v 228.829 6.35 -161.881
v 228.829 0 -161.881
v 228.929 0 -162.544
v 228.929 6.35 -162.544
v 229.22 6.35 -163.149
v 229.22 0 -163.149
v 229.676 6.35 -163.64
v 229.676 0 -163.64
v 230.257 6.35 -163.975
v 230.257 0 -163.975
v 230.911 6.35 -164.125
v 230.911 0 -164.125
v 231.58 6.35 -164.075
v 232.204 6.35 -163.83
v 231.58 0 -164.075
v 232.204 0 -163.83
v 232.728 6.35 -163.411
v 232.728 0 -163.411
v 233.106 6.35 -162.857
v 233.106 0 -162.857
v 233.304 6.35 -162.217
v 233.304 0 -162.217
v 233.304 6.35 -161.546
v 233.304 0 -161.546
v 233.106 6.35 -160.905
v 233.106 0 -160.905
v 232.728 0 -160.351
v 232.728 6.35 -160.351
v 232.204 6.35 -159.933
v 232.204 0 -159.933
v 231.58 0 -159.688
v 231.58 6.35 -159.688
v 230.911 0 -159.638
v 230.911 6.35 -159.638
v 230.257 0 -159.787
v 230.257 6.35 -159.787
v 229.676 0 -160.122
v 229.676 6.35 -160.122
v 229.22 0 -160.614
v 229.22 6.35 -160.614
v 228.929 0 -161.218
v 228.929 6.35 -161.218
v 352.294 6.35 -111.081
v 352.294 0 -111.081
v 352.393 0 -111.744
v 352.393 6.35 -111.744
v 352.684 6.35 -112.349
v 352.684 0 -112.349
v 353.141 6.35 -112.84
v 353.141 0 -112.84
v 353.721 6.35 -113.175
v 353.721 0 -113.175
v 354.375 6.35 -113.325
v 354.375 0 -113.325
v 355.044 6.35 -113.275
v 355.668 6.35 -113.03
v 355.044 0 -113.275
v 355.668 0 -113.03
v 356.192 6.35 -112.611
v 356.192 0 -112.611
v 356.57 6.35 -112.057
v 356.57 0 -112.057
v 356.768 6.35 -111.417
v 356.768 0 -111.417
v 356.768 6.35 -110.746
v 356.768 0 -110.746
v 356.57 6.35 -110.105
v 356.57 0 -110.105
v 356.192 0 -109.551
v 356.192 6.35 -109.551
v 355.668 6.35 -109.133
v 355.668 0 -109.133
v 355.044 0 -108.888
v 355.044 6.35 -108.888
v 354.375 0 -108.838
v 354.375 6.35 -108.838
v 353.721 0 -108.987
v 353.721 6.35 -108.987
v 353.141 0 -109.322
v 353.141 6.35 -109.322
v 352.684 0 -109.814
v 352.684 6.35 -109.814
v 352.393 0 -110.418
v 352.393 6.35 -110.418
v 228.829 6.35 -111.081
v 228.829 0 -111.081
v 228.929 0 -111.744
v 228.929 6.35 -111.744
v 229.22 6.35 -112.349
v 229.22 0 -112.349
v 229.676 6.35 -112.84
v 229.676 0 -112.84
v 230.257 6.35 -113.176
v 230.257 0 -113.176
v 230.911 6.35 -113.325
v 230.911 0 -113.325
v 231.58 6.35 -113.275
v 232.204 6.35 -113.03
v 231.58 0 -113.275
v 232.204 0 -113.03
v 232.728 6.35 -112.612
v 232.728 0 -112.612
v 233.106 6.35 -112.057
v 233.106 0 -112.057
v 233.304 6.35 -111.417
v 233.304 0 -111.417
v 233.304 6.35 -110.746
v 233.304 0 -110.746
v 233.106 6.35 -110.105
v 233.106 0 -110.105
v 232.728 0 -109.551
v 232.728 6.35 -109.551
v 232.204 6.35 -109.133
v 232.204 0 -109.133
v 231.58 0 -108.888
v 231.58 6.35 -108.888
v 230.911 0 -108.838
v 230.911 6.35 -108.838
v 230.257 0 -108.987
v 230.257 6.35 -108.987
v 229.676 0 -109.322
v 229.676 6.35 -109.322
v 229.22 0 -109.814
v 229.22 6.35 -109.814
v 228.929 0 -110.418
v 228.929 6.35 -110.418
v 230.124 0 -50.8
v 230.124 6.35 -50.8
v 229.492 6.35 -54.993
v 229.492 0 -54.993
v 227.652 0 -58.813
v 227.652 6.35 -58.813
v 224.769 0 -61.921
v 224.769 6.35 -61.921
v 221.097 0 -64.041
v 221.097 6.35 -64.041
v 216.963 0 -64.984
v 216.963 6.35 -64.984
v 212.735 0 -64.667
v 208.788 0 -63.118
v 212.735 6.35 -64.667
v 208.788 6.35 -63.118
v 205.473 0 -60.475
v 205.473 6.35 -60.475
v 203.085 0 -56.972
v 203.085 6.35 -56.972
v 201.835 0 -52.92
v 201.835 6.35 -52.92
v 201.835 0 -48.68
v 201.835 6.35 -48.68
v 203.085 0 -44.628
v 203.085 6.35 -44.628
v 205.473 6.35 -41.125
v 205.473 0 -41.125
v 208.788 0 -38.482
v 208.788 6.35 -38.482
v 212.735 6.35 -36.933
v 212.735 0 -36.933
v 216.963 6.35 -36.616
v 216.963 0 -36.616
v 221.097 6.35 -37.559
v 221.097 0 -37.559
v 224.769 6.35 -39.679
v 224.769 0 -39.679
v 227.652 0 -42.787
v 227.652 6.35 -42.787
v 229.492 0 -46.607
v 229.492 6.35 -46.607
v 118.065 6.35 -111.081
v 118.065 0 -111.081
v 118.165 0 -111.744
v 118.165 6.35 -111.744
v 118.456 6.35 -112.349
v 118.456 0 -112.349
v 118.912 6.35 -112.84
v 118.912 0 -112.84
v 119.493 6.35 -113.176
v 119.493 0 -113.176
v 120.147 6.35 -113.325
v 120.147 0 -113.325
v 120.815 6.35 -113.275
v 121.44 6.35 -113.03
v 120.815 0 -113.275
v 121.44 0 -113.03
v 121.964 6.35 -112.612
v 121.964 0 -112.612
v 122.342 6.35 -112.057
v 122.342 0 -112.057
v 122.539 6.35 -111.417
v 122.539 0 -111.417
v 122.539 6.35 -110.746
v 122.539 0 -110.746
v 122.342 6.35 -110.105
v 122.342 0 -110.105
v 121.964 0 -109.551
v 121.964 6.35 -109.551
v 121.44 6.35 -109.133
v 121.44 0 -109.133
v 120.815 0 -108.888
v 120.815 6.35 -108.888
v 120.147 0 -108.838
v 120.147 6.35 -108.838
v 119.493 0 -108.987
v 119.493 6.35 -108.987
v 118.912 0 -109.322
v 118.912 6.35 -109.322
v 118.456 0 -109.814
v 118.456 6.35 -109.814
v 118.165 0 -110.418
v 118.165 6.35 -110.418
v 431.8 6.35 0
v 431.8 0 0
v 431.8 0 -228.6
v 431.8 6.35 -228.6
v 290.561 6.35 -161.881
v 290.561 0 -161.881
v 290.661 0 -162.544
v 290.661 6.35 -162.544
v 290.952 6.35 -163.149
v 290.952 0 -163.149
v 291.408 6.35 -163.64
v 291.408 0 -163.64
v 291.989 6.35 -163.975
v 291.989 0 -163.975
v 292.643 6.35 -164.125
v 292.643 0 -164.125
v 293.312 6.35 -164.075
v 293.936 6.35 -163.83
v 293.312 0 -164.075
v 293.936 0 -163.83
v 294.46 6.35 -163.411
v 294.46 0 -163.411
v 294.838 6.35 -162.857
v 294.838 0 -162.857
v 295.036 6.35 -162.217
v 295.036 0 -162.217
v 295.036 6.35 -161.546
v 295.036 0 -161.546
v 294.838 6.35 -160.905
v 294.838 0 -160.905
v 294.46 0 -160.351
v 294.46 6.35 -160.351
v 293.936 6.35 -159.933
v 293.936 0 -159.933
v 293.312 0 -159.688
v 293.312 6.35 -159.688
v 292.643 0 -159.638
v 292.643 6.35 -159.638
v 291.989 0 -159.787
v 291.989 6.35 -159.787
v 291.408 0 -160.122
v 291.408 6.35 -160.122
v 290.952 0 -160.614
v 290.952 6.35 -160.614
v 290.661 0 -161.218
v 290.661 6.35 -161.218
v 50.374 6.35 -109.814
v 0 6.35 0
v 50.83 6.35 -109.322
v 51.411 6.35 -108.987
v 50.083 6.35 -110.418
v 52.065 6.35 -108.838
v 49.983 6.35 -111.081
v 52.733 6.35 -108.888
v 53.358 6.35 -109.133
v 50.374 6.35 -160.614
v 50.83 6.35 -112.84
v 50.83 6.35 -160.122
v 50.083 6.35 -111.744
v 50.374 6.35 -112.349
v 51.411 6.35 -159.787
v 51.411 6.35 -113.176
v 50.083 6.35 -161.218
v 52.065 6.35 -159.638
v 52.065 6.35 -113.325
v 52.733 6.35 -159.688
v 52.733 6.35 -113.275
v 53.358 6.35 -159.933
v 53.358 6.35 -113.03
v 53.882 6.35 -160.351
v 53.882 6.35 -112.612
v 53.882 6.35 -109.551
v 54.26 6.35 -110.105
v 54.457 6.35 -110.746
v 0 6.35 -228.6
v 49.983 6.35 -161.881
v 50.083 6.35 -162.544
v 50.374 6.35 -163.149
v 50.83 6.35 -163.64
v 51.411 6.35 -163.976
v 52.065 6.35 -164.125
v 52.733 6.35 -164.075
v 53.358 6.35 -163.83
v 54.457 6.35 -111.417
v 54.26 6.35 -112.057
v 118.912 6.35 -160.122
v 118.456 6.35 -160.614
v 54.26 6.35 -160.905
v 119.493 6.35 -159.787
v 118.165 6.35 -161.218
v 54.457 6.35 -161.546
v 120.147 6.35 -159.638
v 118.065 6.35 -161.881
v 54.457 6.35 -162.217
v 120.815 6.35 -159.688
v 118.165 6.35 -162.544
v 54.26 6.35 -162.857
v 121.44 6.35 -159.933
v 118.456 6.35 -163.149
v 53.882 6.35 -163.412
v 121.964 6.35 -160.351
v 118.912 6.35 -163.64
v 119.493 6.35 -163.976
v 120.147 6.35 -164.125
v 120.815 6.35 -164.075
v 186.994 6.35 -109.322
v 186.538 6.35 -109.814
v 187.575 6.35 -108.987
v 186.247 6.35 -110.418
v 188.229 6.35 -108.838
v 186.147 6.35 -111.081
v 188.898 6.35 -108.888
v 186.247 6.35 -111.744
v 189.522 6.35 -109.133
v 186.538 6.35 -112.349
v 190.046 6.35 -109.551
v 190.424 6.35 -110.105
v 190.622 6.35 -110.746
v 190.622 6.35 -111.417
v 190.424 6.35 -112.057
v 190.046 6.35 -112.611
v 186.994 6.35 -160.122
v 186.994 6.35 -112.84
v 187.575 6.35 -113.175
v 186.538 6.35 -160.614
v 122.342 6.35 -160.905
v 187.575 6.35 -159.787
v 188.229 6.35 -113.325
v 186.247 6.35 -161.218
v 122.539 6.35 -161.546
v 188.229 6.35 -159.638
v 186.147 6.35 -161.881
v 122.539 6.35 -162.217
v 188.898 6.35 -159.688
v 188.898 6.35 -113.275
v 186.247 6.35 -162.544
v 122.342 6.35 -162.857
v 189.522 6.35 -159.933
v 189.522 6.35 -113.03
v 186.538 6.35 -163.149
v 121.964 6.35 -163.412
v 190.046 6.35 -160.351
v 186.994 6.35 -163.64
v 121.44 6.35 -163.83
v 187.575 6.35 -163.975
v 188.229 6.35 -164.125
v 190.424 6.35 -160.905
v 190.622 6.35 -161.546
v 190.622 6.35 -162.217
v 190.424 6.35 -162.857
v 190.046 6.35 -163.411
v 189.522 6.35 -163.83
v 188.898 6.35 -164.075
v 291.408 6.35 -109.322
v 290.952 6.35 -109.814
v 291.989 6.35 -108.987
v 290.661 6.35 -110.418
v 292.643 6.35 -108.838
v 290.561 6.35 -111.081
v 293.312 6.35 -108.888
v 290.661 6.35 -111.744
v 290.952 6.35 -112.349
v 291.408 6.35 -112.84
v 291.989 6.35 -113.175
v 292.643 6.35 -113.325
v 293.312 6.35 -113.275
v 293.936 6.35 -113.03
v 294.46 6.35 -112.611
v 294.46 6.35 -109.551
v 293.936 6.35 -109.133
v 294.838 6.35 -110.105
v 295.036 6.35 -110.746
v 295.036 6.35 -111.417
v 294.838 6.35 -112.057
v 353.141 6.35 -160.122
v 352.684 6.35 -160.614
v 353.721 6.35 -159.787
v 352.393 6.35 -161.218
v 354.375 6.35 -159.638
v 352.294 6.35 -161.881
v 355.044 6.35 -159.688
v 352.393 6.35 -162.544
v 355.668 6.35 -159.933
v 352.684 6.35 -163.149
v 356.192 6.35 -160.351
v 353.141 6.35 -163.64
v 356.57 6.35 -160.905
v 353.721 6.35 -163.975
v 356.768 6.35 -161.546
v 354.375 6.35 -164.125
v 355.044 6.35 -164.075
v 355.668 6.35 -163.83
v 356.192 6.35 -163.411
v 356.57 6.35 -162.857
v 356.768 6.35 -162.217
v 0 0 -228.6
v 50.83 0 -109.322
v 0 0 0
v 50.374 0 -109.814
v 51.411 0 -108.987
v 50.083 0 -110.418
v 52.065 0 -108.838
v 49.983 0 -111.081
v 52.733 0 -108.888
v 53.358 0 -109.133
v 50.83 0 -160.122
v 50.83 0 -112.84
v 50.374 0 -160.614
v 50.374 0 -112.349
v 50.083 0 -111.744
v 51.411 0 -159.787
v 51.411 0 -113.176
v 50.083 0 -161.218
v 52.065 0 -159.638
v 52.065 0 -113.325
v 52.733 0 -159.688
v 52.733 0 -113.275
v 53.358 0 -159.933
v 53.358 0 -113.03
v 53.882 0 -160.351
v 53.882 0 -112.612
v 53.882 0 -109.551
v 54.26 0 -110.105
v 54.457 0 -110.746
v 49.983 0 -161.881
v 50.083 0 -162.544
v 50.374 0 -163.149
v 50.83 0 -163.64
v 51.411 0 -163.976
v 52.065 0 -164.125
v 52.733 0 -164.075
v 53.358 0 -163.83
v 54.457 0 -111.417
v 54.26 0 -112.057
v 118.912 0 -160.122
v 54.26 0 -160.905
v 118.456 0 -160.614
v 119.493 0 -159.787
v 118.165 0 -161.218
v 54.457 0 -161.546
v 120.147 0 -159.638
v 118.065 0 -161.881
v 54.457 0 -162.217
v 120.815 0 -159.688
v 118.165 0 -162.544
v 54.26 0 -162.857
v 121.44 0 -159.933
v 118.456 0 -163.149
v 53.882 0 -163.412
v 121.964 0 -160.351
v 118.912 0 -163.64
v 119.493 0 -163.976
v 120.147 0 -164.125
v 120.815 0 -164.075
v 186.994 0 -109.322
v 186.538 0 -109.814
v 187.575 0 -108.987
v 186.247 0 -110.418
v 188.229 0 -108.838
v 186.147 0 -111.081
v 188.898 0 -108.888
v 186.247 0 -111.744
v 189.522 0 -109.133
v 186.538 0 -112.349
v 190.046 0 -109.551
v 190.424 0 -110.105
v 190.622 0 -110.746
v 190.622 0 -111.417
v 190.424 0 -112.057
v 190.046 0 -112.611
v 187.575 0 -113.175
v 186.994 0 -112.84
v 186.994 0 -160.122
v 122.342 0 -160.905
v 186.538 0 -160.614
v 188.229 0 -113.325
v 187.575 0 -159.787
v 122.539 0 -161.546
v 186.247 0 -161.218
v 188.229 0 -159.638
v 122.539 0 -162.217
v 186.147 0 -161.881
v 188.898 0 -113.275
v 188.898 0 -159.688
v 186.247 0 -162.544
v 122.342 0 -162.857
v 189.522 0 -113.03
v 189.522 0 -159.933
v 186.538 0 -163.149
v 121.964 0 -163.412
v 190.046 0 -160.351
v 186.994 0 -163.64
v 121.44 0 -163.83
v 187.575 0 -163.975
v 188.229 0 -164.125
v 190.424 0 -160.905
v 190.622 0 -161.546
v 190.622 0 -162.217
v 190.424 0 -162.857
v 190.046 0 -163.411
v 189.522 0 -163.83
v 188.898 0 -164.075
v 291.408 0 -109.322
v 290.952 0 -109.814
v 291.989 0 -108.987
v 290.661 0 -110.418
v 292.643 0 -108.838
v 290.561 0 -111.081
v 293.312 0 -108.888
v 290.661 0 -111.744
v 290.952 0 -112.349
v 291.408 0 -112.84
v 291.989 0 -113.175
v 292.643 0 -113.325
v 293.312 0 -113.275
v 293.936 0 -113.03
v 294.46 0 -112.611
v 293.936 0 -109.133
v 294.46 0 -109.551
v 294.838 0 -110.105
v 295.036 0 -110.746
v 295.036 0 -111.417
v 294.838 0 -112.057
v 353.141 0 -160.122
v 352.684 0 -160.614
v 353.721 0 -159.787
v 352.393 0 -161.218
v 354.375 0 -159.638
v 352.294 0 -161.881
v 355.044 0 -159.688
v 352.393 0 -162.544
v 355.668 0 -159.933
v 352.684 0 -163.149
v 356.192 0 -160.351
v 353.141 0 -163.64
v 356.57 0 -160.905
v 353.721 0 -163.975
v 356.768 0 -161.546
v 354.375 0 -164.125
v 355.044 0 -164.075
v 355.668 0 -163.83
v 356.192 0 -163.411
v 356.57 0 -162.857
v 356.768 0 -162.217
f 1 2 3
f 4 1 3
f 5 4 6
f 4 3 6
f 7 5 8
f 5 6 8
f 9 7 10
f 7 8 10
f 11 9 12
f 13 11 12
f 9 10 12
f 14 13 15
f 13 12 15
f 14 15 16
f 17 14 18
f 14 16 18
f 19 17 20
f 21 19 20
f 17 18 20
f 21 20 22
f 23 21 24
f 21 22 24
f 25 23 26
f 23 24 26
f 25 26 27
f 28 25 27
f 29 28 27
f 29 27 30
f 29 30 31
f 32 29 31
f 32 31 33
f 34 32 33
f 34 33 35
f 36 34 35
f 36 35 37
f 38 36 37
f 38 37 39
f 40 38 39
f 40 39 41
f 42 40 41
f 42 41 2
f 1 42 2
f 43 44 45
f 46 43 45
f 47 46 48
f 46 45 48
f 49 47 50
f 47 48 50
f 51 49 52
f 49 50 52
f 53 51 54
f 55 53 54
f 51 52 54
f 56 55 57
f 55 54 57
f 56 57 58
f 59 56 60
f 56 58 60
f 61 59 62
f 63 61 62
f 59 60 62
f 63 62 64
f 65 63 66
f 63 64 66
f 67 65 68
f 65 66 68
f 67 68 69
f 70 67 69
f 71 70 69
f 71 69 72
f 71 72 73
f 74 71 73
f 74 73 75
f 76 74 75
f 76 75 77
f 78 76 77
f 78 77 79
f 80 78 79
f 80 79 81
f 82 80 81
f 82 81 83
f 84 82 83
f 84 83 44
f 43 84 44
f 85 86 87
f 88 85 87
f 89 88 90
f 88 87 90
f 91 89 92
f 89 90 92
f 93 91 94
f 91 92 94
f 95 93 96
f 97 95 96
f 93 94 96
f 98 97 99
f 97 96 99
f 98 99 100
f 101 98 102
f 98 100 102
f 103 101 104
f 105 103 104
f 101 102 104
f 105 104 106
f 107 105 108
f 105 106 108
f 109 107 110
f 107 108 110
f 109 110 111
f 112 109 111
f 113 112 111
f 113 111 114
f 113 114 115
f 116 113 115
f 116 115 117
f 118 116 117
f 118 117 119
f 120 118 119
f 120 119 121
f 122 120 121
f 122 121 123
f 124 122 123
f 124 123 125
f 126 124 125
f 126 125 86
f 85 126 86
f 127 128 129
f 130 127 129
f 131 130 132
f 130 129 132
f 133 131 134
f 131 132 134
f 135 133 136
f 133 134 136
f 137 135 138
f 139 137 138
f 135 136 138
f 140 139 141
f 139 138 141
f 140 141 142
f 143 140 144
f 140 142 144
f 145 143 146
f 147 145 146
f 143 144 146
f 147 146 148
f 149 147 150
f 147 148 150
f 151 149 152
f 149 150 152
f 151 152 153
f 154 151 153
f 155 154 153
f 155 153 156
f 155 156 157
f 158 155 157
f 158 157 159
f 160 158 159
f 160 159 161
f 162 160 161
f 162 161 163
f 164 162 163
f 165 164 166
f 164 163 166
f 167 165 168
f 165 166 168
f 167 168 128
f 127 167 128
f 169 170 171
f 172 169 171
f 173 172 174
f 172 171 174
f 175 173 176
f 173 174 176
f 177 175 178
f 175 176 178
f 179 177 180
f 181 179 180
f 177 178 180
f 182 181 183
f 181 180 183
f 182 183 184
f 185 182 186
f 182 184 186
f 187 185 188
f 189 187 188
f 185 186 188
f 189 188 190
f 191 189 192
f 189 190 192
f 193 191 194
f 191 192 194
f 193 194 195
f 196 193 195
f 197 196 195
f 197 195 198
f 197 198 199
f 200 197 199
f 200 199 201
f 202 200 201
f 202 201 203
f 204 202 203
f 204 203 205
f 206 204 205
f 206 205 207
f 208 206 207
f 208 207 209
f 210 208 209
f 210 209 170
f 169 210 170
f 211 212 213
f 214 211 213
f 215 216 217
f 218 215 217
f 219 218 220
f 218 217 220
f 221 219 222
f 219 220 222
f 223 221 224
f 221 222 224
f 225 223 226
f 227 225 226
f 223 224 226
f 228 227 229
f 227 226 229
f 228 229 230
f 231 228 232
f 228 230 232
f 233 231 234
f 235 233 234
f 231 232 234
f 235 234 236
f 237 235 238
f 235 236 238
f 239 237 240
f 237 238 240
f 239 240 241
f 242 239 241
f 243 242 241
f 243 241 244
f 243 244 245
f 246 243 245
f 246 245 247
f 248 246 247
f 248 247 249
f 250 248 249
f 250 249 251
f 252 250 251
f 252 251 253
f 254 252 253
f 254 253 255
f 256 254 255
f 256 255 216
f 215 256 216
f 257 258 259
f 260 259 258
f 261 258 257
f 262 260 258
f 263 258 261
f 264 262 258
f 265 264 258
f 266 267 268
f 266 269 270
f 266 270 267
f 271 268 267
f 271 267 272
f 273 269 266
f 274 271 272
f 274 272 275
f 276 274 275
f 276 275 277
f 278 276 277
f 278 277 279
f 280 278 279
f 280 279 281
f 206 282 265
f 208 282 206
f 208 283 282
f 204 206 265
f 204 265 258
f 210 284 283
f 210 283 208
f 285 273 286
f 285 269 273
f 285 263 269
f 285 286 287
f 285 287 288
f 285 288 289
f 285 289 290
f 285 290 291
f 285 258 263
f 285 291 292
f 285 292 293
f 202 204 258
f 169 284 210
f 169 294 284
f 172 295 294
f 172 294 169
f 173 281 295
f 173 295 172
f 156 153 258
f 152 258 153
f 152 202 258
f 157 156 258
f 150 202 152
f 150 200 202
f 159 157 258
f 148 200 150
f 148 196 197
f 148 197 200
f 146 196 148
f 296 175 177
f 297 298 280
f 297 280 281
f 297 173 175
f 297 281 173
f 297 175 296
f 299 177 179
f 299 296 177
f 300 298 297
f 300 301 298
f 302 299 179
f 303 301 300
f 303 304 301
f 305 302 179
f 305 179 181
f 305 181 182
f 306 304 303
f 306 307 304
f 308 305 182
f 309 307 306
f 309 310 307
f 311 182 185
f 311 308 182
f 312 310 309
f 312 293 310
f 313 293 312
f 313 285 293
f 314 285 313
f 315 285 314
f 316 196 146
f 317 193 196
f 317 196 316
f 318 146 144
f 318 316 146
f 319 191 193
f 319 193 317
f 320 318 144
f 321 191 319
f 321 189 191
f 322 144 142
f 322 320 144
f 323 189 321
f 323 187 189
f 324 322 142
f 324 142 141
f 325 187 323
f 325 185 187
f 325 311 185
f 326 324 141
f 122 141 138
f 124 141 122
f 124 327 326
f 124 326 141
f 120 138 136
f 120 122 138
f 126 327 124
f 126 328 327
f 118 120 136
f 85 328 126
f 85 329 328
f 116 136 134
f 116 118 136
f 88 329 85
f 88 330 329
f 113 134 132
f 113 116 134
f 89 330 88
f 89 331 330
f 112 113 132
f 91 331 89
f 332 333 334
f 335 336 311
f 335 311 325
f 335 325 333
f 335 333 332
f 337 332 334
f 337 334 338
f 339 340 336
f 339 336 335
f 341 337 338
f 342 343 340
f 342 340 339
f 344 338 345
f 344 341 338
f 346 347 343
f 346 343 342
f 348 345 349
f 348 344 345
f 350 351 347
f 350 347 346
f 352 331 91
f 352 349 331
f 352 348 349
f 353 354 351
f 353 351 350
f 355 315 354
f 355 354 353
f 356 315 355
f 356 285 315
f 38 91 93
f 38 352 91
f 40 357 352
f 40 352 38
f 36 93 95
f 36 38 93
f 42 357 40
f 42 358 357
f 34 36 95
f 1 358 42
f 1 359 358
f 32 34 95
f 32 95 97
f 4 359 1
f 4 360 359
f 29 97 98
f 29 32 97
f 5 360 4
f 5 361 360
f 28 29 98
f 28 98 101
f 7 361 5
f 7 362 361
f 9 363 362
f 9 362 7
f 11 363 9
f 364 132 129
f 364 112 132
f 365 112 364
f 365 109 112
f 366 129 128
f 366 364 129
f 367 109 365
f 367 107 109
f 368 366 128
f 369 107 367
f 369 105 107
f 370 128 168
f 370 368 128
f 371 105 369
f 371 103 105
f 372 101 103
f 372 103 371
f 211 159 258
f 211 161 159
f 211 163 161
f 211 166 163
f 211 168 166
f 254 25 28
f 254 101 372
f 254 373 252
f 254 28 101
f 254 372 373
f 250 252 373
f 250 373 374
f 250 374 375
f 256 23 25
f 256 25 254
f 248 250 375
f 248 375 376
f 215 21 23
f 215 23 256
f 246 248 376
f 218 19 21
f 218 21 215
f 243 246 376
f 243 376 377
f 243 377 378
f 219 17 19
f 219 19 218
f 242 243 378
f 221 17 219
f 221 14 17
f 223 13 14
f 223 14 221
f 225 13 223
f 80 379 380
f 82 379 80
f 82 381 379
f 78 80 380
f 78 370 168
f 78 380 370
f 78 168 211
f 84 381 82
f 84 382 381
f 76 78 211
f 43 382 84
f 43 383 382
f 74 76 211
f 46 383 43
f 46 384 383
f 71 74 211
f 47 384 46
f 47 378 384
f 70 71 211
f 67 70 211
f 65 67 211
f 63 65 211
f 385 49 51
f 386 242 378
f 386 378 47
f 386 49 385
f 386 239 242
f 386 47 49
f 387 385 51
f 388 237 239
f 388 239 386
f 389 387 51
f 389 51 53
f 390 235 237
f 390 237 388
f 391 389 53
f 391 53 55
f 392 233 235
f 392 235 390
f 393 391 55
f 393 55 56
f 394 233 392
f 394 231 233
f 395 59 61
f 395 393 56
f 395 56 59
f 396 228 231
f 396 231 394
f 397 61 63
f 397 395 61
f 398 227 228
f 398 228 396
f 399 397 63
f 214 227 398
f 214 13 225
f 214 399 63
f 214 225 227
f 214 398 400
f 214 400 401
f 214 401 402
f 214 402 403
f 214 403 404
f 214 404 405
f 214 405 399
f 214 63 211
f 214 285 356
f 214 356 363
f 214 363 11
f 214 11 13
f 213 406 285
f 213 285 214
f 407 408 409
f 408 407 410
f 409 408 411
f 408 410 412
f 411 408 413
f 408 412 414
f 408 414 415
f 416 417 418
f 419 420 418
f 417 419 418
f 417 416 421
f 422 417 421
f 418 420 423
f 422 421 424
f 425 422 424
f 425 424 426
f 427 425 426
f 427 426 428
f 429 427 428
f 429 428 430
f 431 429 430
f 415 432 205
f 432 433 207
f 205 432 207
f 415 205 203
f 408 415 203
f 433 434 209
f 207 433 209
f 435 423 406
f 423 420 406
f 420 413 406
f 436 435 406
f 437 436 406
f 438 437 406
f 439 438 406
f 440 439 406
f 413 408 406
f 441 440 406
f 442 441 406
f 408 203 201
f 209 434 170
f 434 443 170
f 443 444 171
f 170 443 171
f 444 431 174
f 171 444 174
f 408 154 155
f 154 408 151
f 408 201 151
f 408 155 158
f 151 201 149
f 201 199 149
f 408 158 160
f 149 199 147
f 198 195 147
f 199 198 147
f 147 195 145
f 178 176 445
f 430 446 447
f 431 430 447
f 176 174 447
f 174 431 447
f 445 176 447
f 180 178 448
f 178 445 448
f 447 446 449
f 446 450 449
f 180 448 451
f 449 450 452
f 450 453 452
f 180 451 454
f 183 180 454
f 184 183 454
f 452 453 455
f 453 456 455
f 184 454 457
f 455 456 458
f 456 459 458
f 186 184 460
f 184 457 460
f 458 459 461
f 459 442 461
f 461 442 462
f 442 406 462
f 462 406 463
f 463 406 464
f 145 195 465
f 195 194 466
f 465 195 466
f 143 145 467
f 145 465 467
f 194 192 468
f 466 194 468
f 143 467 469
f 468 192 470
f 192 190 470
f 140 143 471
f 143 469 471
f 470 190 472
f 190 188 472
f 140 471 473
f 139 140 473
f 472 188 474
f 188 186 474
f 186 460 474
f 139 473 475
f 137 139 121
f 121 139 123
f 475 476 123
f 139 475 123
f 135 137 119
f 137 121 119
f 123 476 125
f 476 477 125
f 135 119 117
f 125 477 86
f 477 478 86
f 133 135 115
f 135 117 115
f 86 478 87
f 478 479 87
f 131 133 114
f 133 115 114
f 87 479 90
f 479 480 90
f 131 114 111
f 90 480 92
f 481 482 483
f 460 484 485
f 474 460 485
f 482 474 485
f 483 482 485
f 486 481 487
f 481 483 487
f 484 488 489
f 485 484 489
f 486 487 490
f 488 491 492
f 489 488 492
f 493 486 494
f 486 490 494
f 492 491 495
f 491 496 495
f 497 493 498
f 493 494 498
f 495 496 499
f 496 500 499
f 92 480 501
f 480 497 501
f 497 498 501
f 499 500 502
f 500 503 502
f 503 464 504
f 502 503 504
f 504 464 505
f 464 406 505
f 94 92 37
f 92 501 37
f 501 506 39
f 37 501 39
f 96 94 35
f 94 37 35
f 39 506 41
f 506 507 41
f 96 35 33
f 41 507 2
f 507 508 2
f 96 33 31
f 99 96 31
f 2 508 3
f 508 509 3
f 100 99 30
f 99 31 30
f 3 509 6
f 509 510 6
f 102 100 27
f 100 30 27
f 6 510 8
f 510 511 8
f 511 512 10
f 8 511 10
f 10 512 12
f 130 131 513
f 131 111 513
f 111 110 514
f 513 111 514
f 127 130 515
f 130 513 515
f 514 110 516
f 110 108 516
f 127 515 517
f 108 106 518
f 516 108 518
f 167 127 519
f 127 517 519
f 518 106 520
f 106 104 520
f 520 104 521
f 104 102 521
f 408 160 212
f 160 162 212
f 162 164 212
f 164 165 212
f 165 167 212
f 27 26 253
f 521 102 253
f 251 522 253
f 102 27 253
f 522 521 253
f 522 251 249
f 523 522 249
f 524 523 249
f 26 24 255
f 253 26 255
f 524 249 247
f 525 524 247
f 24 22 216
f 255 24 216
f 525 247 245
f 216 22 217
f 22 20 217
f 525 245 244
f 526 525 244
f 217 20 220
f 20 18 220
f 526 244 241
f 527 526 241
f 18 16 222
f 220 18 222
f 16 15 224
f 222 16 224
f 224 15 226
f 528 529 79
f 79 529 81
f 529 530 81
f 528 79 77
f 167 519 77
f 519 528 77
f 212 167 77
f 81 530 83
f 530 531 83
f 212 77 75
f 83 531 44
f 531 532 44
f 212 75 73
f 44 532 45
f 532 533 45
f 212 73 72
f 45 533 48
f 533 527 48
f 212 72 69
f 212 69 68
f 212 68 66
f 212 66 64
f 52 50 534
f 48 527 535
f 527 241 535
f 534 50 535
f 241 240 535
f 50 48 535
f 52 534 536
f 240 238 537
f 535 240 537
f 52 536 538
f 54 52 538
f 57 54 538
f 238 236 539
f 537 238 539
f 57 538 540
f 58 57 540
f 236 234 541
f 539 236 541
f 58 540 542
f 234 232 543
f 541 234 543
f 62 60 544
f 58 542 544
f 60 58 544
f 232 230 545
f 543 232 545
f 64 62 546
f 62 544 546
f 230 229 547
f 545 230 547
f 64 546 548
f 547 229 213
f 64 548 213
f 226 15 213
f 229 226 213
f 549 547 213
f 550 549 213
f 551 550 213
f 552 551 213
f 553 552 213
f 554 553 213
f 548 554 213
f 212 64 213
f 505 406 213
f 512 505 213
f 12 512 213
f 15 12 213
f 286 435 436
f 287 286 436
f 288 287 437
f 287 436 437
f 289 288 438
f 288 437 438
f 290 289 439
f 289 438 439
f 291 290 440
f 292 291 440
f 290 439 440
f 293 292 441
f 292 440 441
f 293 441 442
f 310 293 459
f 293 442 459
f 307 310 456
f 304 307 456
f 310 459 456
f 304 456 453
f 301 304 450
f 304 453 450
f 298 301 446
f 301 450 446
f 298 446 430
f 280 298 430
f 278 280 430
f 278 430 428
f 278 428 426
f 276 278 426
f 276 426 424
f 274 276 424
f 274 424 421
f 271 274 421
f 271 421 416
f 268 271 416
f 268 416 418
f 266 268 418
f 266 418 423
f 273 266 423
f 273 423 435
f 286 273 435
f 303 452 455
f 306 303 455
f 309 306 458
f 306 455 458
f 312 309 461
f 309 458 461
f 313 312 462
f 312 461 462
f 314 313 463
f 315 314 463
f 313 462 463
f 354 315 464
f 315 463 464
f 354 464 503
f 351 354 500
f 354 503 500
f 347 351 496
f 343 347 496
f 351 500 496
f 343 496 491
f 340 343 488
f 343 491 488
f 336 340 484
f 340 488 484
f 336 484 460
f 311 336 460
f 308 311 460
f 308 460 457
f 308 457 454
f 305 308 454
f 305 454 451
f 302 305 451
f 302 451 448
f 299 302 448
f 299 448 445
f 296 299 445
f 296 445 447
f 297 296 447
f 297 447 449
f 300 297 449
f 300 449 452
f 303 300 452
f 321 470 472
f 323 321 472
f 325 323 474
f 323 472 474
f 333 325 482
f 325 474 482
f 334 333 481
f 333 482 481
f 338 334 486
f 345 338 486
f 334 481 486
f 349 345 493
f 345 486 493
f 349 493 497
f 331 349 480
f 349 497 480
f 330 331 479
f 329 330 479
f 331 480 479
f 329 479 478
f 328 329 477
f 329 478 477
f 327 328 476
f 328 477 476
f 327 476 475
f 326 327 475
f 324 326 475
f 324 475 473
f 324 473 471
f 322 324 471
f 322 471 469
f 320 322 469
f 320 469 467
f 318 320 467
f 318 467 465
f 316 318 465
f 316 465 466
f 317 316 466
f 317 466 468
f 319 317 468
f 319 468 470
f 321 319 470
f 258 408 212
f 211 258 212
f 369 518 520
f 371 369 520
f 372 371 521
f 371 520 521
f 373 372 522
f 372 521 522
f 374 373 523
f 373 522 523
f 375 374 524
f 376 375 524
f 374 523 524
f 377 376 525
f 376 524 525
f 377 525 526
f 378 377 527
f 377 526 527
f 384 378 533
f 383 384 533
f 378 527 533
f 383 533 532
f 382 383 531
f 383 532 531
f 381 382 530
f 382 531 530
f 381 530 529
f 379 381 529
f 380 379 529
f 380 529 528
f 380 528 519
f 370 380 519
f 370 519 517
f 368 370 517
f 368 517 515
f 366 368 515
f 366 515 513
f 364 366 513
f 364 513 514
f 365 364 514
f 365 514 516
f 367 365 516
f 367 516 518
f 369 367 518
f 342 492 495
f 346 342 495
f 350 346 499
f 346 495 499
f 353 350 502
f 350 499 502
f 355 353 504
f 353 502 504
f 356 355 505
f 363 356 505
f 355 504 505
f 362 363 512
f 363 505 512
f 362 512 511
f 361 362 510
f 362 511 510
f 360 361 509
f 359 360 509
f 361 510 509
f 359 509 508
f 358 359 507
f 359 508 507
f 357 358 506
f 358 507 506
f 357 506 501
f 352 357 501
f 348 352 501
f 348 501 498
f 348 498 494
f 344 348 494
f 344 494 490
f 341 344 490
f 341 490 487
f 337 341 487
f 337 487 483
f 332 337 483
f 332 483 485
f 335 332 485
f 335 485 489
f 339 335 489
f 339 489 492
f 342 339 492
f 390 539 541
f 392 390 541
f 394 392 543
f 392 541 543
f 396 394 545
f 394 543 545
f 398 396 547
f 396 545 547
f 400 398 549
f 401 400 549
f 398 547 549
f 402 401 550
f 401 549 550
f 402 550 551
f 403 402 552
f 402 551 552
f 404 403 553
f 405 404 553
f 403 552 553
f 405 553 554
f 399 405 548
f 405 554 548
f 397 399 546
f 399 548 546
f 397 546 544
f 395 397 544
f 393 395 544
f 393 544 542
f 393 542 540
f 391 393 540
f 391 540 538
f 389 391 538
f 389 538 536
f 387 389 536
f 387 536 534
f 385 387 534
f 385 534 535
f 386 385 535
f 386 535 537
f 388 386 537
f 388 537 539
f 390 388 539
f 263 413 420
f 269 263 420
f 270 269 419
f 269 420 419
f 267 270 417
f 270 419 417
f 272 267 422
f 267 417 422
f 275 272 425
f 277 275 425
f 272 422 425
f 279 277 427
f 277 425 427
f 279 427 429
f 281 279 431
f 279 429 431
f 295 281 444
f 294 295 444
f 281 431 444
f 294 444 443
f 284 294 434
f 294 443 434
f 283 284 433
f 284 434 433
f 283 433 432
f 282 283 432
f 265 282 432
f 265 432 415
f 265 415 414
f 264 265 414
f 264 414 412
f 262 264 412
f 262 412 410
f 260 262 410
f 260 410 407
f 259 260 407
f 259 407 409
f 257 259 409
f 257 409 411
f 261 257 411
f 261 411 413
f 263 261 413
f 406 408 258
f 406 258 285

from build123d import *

# Parameters (mm, degrees)
SKETCH2_W           = 431.8
SKETCH2_H           = 228.6
BOSS_EXTRUDE1_DEPTH = 6.35
SKETCH4_R           = 14.224
CUT_EXTRUDE1_DEPTH  = 6.35
SKETCH5_R           = 2.24967597
CUT_EXTRUDE2_DEPTH  = 25.4
SKETCH6_R           = 2.24967597
SKETCH6_R_2         = 2.249660739
SKETCH6_R_3         = 2.249660728
CUT_EXTRUDE3_DEPTH  = 25.4
SKETCH7_R           = 2.24967597
SKETCH7_R_2         = 2.249660728
CUT_EXTRUDE4_DEPTH  = 25.4


with BuildPart() as part:
    # Sketch2 → Boss-Extrude1 (new body)
    with BuildSketch(Plane(origin=(0, 0, 0), x_dir=(1, 0, 0), z_dir=(0, 1, 0))):
        with Locations((215.9, 114.3)):
            Rectangle(SKETCH2_W, SKETCH2_H)
    extrude(amount=BOSS_EXTRUDE1_DEPTH)

    # Sketch4 → Cut-Extrude1 (cut)
    with BuildSketch(Plane(origin=(0, 6.35, 0), x_dir=(1, 0, 0), z_dir=(0, 1, 0))):
        with Locations((215.9, 50.8)):
            Circle(SKETCH4_R)
    extrude(amount=-CUT_EXTRUDE1_DEPTH, mode=Mode.SUBTRACT)

    # Sketch5 → Cut-Extrude2 (cut)
    with BuildSketch(Plane(origin=(0, 0, 0), x_dir=(-1, 0, 0), z_dir=(0, -1, 0))):
        with Locations((-52.232812268, 111.081338493)):
            Circle(SKETCH5_R)
        with Locations((-52.232812268, 161.881338493)):
            Circle(SKETCH5_R)
    extrude(amount=-CUT_EXTRUDE2_DEPTH, mode=Mode.SUBTRACT)

    # Sketch6 → Cut-Extrude3 (cut)
    with BuildSketch(Plane(origin=(0, 0, 0), x_dir=(-1, 0, 0), z_dir=(0, -1, 0))):
        with Locations((-120.314890813, 111.081338493)):
            Circle(SKETCH6_R)
        with Locations((-120.314890813, 161.881338493)):
            Circle(SKETCH6_R)
        with Locations((-188.396969359, 111.081338493)):
            Circle(SKETCH6_R_2)
        with Locations((-188.396969359, 161.881338493)):
            Circle(SKETCH6_R_3)
    extrude(amount=-CUT_EXTRUDE3_DEPTH, mode=Mode.SUBTRACT)

    # Sketch7 → Cut-Extrude4 (cut)
    with BuildSketch(Plane(origin=(0, 0, 0), x_dir=(-1, 0, 0), z_dir=(0, -1, 0))):
        with Locations((-231.079047904, 111.081338493)):
            Circle(SKETCH7_R)
        with Locations((-231.079047904, 161.881338493)):
            Circle(SKETCH7_R_2)
        with Locations((-292.811126449, 111.081338493)):
            Circle(SKETCH7_R_2)
        with Locations((-292.811126449, 161.881338493)):
            Circle(SKETCH7_R_2)
        with Locations((-354.543204994, 111.081338493)):
            Circle(SKETCH7_R_2)
        with Locations((-354.543204994, 161.881338493)):
            Circle(SKETCH7_R_2)
    extrude(amount=-CUT_EXTRUDE4_DEPTH, mode=Mode.SUBTRACT)


solid = part.part
